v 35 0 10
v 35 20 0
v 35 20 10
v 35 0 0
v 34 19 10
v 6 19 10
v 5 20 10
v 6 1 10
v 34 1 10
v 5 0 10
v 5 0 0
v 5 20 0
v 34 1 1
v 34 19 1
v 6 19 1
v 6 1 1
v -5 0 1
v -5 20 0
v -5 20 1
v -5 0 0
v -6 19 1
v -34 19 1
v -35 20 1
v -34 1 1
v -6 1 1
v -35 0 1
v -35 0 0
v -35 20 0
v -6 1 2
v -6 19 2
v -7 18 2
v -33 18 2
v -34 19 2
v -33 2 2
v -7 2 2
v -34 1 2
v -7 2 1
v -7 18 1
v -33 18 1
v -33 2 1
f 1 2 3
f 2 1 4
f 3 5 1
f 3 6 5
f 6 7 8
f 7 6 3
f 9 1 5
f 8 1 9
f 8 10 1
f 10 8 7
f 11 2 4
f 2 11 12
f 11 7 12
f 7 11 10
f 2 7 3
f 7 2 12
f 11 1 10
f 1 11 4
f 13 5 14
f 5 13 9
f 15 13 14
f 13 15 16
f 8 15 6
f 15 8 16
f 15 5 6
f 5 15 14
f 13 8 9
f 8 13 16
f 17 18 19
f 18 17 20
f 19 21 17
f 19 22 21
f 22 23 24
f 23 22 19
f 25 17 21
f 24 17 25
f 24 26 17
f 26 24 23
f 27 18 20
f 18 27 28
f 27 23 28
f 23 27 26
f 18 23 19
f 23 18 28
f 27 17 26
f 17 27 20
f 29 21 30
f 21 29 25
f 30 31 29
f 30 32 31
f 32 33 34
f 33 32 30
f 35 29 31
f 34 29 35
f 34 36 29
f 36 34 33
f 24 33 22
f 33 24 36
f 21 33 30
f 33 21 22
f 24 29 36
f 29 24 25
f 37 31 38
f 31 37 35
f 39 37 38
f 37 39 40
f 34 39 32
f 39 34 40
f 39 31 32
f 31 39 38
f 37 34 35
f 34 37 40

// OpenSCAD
module box(l, w, h, t)
{
  t2 = t * 2;
  difference()
  {
    cube( size=[l,w,h] );
    translate([t,t,t])
      cube( size=[l-t2, w-t2, h-t]) ;
  }
}

module lid(l, w, t)
{
  t2 = t * 2;
  t4 = t * 4;
  difference()
  {
    union()
    {
      cube( size=[l, w, t] );
      translate( [t, t, t*0.5] )
        cube( size=[l-t2, w-t2, t*1.5] );
    }
    translate( [t2, t2, t] )
      cube( size=[l-t4, w-t4, t2] );
  }
}

module support(dl, dw, h, od, id)
{
	// TBD: PCB support posts
}

module case()
{
	// TBD: case with PCB and lid attachment supports
}

// Try it out
l = 30;		// Length
w = 20;		// Width
h = 10;		// Height
t = 1;		// Wall thickness
s = 5;		// Spacing

translate([s,0,0])
  box(l, w, h, t);

translate([-s-l, 0, 0])
  lid(l, w, t);
